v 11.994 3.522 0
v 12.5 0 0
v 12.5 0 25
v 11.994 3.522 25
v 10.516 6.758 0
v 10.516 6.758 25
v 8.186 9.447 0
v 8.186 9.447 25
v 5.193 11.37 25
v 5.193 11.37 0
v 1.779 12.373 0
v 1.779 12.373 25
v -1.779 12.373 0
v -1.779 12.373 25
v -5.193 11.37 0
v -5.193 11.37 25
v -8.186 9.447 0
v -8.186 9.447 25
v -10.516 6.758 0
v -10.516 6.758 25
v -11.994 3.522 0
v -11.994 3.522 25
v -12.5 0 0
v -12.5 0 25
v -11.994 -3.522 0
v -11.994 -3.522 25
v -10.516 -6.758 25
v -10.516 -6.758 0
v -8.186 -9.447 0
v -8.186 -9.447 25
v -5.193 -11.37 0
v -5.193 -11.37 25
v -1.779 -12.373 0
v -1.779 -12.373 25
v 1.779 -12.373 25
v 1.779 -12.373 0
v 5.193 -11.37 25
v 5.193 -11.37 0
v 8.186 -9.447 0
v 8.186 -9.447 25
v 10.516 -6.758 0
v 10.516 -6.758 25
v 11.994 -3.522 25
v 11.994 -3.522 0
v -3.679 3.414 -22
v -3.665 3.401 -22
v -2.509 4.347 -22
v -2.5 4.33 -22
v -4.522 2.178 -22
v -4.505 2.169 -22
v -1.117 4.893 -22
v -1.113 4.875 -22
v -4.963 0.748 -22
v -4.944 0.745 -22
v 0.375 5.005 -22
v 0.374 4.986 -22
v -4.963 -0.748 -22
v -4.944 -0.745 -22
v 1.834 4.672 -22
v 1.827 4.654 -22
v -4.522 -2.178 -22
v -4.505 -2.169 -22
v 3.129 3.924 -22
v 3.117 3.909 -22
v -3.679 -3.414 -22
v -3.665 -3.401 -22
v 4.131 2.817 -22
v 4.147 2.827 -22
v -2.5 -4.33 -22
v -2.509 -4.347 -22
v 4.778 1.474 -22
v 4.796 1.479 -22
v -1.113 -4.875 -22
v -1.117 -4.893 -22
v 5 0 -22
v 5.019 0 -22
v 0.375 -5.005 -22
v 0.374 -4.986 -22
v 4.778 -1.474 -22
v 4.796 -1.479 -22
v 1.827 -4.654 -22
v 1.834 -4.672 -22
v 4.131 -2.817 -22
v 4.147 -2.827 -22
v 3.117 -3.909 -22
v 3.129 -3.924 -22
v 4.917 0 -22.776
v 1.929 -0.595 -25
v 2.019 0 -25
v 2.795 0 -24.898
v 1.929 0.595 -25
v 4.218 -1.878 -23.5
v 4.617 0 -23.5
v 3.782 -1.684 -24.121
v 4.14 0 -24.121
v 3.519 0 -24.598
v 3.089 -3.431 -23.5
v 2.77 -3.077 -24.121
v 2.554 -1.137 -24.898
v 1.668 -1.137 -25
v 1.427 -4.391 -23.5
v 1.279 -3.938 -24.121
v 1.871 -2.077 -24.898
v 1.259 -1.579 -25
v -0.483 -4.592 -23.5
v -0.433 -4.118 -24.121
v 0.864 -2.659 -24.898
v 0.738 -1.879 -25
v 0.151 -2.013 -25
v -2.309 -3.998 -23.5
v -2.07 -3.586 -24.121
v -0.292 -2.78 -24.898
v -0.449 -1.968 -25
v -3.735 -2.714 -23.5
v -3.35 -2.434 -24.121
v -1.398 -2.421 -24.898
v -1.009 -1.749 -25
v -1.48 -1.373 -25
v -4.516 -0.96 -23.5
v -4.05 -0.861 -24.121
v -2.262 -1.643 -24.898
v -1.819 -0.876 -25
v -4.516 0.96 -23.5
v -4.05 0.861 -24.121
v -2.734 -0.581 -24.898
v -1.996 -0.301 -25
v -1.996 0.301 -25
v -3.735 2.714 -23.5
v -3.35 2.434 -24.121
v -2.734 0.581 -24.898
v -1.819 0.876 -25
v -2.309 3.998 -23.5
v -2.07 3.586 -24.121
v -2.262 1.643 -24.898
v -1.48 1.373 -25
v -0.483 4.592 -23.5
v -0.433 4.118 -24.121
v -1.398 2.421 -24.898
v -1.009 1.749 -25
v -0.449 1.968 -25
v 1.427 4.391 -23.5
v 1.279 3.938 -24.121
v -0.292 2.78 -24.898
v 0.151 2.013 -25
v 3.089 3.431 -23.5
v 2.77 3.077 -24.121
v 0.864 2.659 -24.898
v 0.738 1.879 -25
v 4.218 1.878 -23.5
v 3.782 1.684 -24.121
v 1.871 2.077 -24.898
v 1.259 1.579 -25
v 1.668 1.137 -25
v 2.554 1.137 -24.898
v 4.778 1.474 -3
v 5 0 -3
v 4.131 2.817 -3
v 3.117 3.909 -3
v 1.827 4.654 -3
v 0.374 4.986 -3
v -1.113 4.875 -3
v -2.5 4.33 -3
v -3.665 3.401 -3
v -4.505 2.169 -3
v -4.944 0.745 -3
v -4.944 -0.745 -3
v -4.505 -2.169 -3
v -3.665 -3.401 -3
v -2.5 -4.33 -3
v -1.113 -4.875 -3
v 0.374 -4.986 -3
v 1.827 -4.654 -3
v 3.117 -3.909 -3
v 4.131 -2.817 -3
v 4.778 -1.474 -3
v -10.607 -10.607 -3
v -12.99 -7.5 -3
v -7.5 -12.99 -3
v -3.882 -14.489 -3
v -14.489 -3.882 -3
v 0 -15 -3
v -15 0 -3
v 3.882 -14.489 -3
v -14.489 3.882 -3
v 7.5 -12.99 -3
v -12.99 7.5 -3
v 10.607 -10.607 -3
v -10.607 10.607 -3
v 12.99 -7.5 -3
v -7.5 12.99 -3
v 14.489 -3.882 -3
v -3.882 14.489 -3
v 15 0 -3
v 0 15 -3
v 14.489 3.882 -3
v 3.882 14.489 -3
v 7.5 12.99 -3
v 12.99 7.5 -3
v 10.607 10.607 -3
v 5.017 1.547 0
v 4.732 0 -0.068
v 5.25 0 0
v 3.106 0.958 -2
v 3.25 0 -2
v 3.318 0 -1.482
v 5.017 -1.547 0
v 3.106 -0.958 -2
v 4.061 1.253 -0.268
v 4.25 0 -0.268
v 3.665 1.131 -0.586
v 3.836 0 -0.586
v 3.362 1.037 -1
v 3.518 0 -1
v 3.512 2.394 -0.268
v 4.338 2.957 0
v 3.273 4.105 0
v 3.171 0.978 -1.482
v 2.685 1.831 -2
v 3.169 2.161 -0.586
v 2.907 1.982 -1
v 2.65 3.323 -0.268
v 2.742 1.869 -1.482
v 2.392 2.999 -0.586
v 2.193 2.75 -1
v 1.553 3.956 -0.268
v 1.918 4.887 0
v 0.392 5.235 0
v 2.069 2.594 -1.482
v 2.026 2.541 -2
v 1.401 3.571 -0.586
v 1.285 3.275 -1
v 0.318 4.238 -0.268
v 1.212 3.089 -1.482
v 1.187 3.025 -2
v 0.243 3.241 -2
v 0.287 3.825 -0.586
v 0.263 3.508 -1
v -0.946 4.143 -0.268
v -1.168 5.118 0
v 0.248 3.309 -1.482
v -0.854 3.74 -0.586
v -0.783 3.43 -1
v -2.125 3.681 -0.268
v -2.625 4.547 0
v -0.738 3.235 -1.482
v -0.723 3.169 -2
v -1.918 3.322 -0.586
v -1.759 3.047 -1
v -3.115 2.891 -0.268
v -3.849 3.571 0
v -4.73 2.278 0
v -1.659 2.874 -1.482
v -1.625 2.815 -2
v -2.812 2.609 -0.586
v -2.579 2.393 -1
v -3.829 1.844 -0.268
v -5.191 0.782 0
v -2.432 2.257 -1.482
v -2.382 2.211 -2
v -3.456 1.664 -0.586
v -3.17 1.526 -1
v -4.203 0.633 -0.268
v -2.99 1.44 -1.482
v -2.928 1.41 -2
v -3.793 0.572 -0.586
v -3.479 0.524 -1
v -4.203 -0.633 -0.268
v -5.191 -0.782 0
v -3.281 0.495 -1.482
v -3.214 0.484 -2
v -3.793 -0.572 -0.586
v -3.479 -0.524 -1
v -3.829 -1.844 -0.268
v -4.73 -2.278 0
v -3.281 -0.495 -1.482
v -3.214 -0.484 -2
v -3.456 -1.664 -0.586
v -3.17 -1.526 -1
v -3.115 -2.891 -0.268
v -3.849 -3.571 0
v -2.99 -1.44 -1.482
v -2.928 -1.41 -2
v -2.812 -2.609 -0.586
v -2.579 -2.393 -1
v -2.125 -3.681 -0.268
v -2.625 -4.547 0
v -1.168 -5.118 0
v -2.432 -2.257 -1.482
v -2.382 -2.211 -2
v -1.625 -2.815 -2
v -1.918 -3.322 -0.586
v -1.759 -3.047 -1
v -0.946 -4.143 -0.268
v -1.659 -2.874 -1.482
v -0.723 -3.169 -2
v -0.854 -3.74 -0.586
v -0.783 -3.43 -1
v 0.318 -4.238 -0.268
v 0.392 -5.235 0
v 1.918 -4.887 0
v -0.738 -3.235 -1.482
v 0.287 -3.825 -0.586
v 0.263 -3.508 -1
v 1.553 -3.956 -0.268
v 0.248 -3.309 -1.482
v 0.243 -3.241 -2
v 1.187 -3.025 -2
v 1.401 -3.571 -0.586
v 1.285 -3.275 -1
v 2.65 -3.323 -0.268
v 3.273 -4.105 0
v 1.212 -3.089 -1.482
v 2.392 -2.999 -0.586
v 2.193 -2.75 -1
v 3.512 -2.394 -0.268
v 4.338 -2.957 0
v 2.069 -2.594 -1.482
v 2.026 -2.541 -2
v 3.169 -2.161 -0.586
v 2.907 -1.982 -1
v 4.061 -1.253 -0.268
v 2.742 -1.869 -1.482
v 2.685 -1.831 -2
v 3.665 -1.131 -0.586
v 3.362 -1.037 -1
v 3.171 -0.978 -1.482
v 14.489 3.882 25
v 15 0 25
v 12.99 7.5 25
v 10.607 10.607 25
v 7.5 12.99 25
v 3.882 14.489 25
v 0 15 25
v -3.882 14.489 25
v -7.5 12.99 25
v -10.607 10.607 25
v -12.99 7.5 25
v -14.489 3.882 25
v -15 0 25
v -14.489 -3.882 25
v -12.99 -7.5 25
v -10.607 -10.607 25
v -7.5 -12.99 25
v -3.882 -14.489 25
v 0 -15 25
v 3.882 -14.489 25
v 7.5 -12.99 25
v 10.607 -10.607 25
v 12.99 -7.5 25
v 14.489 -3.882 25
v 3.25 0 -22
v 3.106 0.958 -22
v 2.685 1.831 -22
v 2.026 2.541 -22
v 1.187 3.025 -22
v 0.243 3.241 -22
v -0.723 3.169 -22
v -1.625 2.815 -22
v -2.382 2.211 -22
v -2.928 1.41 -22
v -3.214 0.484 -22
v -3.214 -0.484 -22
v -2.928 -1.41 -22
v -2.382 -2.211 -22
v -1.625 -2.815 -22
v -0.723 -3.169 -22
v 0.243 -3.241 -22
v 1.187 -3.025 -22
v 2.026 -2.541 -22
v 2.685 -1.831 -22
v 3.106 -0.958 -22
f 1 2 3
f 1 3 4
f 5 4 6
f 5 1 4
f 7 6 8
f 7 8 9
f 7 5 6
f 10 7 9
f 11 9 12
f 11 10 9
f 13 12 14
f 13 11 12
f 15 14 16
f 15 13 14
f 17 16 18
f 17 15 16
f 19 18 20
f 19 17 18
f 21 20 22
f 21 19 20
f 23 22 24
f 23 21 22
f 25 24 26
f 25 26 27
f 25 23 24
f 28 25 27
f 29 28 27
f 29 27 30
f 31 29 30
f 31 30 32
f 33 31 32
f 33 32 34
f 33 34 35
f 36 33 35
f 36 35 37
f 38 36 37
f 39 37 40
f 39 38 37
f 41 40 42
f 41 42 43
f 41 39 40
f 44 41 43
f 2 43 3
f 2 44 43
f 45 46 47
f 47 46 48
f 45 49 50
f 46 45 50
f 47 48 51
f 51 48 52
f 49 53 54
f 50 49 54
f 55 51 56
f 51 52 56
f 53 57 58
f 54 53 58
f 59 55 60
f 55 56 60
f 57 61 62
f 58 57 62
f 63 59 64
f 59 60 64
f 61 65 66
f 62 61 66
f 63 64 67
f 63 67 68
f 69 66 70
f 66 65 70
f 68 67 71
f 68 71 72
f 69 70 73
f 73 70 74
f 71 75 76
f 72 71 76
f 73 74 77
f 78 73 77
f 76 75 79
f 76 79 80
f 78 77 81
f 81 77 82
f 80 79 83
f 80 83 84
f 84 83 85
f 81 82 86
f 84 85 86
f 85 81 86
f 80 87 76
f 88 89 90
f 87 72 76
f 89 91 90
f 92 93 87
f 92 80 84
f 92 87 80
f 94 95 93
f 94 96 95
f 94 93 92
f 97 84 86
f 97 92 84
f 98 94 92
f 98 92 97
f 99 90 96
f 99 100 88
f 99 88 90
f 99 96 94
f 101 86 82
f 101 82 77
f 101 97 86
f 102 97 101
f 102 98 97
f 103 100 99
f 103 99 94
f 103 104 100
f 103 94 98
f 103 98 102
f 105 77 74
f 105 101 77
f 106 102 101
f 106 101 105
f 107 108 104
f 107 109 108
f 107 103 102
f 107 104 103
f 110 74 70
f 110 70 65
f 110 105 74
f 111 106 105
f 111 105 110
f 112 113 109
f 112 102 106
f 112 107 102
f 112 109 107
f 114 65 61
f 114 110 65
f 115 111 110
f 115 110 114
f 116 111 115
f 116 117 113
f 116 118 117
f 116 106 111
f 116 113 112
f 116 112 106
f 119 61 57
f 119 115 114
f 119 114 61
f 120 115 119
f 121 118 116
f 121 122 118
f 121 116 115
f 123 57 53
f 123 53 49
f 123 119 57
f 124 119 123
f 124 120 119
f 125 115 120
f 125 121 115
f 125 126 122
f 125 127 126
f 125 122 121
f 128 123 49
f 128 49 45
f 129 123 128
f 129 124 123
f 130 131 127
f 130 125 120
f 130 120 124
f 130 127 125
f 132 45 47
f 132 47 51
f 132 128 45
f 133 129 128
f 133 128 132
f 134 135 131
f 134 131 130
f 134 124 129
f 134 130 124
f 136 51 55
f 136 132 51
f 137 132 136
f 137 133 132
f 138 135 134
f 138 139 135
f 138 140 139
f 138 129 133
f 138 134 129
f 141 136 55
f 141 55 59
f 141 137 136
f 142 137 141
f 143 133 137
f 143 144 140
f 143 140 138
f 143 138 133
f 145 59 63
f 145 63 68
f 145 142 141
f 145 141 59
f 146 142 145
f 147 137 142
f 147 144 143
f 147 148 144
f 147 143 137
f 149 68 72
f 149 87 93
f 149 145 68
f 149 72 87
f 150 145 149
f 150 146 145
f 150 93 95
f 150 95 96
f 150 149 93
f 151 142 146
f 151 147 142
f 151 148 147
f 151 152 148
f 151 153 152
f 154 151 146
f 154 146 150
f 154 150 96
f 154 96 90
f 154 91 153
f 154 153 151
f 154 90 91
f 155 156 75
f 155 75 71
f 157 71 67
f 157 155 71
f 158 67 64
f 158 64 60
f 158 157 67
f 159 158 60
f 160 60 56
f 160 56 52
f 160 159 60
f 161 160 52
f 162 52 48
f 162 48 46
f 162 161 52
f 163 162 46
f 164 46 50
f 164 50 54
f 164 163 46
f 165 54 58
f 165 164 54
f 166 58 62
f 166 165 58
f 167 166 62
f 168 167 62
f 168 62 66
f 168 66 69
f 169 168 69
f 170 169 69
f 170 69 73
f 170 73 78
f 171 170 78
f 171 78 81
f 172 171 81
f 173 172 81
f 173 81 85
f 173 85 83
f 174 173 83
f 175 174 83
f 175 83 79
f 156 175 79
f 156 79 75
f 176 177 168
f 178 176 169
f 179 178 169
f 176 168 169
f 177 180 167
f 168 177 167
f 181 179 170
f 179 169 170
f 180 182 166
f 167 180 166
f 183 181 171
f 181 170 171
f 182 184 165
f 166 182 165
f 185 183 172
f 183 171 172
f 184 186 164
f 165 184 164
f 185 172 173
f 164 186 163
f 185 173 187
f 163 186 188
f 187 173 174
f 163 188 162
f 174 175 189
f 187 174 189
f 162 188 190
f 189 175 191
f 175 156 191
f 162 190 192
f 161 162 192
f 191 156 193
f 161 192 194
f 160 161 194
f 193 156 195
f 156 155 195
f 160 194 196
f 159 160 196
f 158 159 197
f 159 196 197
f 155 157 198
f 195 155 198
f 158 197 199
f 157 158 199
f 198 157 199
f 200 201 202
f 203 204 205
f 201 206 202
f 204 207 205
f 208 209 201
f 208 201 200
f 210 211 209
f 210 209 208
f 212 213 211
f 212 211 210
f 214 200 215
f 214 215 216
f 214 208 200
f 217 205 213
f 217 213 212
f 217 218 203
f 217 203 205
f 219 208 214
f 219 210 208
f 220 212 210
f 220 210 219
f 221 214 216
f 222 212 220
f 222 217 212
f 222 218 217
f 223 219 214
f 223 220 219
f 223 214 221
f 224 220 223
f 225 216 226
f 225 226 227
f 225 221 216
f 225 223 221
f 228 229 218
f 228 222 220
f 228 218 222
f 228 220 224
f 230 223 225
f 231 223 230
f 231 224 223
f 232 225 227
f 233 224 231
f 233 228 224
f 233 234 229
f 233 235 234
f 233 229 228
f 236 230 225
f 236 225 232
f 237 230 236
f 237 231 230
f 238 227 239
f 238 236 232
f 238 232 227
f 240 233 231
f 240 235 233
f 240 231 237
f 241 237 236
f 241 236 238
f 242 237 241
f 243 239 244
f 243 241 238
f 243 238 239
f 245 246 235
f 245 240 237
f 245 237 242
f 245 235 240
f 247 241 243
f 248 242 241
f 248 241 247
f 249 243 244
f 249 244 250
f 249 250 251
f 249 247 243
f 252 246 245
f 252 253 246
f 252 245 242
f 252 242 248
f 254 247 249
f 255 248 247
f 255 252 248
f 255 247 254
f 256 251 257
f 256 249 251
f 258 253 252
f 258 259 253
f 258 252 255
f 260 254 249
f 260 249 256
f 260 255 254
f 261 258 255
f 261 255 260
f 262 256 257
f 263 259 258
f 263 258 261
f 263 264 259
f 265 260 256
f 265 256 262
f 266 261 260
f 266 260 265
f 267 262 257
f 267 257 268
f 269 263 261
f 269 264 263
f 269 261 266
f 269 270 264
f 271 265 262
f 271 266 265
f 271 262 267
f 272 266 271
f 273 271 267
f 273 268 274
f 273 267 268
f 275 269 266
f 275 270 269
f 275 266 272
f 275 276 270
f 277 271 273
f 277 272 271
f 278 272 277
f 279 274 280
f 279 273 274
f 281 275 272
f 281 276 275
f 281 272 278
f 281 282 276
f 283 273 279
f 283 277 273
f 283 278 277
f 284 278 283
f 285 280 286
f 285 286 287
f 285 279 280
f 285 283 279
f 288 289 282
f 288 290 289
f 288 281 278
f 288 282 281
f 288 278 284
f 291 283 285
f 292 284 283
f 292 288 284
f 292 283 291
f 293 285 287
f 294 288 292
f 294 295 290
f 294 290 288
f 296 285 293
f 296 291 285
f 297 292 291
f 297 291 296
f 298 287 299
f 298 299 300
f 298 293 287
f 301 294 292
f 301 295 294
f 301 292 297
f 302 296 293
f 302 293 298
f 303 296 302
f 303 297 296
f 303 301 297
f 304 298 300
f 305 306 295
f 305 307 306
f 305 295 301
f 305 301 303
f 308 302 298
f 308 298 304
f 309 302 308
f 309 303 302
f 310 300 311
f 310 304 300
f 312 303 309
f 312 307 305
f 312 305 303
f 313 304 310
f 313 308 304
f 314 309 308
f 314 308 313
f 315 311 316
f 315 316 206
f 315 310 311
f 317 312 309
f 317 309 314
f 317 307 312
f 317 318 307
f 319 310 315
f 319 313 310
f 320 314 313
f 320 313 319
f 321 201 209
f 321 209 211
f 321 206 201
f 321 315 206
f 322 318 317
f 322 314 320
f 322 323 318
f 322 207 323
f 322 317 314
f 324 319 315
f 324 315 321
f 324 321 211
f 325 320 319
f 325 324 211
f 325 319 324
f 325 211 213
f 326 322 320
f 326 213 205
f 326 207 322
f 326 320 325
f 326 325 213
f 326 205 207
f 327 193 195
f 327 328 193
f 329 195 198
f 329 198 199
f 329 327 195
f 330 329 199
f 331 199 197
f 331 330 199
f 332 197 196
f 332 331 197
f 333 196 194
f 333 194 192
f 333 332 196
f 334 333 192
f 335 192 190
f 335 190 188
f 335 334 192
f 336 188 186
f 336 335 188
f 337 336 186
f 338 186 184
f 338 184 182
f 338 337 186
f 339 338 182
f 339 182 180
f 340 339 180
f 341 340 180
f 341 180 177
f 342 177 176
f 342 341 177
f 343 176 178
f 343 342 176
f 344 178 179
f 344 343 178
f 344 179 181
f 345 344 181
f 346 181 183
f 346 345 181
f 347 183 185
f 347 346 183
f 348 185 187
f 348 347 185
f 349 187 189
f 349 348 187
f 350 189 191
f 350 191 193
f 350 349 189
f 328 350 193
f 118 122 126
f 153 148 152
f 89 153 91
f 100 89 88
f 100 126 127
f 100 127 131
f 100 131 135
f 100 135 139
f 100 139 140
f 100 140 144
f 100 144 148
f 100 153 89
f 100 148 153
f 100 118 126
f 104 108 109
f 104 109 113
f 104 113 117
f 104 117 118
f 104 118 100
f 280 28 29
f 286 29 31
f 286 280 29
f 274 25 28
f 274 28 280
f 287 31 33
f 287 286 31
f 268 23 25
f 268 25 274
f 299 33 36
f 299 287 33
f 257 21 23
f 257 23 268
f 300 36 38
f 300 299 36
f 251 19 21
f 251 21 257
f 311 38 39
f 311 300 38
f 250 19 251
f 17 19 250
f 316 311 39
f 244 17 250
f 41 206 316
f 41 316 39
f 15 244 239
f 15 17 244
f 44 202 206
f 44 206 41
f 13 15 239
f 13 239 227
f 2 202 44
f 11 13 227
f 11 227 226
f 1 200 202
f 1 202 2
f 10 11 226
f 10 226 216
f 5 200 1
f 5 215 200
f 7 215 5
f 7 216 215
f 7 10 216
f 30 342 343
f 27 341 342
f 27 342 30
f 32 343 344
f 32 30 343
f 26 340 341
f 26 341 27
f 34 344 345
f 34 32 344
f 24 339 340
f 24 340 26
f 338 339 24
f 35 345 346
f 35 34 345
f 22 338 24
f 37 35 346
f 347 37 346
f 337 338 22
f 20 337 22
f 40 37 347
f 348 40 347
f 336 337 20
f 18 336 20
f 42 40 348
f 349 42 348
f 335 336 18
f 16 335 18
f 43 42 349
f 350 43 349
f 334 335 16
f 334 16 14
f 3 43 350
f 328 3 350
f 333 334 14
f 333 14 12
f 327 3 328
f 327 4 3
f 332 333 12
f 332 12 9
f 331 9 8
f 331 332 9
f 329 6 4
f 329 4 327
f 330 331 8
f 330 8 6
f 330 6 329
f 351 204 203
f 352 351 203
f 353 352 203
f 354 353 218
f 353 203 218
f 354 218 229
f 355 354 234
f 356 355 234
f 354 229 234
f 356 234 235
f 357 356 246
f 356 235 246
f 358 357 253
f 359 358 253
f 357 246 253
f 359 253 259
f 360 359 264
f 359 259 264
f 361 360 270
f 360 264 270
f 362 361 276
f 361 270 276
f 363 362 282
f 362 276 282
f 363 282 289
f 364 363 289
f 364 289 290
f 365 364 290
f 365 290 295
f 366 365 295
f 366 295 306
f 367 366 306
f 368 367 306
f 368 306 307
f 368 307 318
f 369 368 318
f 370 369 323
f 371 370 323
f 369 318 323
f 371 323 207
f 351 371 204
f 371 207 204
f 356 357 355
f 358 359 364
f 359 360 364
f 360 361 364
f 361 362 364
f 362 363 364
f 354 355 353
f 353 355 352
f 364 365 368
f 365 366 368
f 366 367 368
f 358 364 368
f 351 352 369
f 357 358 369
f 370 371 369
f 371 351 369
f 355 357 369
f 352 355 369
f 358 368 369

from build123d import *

# Parameters (mm, degrees)
F0_R     = 15
F0_R_2   = 12.5
F7_DEPTH = 25
F0_R_3   = 5
F1_DEPTH = 3
F0_R_4   = 3.25
F2_DEPTH = 22
F3_R     = 5.0189857481
F4_DEPTH = 3
F5_R     = 2.99999
F6_R     = 2


# Not quite as in the source:
# - a fillet or chamfer is up to 0.001 mm smaller than in the source, because OpenCascade refuses the exact size


with BuildPart() as f7:
    # F0 (on Top) → F7 (new body)
    with BuildSketch(Plane.XY):
        Circle(F0_R)
        Circle(F0_R_2, mode=Mode.SUBTRACT)
    extrude(amount=F7_DEPTH)

    # F0 (on Top) → F1 (join)
    with BuildSketch(Plane.XY):
        Circle(F0_R)
        Circle(F0_R_2, mode=Mode.SUBTRACT)
        Circle(F0_R_2)
        Circle(F0_R_3, mode=Mode.SUBTRACT)
    extrude(amount=-F1_DEPTH)

    # F0 (on Top) → F2 (join)
    with BuildSketch(Plane.XY):
        Circle(F0_R_3)
        Circle(F0_R_4, mode=Mode.SUBTRACT)
    extrude(amount=-F2_DEPTH)

    # F3 (on face) → F4 (join)
    with BuildSketch(Plane(origin=(0, 0, -22), x_dir=(1, 0, 0), z_dir=(0, 0, -1))):
        Circle(F3_R)
    extrude(amount=F4_DEPTH)

    # F5 (radius 3 in the source; OpenCascade refuses exactly that, so slightly less here)
    f5_edges = [f7.edges().sort_by_distance(p)[0] for p in [
        (-5.018986, 0, -25),
    ]]
    fillet(f5_edges, radius=F5_R)

    # F6
    f6_edges = [f7.edges().sort_by_distance(p)[0] for p in [
        (-3.25, 0, 0),
    ]]
    fillet(f6_edges, radius=F6_R)


solid = f7.part
